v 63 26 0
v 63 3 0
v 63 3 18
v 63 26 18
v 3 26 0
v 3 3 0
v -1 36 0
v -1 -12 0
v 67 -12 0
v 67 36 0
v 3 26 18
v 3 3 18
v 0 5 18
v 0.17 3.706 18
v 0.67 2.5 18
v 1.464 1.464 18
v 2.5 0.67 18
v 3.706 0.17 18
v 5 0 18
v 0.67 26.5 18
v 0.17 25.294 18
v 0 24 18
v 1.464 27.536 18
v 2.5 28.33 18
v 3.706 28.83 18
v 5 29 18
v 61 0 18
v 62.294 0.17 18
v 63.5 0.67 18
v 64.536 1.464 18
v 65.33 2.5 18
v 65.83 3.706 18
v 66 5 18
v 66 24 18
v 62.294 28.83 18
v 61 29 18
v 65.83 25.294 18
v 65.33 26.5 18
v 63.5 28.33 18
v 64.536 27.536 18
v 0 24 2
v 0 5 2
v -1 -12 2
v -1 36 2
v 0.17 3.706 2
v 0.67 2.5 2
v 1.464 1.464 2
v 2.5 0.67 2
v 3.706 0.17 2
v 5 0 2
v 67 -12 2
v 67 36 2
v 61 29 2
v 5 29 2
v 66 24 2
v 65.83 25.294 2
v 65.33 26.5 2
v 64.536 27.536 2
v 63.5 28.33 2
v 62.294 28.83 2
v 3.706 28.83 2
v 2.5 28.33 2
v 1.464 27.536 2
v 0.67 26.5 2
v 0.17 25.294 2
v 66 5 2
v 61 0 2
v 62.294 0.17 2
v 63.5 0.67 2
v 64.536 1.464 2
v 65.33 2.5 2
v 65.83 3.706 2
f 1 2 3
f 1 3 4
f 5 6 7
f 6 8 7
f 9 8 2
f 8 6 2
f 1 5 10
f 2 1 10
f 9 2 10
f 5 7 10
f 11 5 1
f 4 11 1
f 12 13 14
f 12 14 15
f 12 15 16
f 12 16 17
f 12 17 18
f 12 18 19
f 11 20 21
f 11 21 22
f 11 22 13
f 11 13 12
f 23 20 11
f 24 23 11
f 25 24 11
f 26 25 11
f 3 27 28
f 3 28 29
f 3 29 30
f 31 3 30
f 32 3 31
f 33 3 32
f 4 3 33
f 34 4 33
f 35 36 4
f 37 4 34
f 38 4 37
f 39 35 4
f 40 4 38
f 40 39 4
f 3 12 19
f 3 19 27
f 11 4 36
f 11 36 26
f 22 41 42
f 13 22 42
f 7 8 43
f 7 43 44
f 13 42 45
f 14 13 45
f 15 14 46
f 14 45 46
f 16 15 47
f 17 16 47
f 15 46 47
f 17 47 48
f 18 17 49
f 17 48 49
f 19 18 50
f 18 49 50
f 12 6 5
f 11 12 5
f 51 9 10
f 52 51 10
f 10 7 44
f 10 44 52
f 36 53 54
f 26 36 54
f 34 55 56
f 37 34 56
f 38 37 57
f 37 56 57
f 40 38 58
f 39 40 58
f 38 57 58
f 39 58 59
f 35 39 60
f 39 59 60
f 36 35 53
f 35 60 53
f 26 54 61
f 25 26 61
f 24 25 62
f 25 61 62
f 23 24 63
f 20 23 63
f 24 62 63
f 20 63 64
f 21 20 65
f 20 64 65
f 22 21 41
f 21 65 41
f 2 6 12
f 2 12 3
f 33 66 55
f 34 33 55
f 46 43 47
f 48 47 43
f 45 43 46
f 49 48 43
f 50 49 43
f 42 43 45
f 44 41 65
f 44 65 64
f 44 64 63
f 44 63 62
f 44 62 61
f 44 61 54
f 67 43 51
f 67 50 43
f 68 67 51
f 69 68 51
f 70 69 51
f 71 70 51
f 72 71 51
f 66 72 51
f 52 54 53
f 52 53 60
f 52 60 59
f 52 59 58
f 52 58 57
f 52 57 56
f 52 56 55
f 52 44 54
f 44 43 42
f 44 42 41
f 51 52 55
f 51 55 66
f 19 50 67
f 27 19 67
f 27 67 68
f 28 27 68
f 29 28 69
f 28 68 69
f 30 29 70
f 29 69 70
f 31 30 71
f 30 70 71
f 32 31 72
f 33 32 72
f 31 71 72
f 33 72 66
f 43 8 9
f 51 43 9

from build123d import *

# Parameters (mm, degrees)
F0_W     = 68
F0_H     = 48
F1_DEPTH = 2
F0_W_2   = 60
F0_H_2   = 23
F2_DEPTH = 18


with BuildPart() as f1:
    # F0 (on Top) → F1 (new body)
    with BuildSketch(Plane.XY):
        with Locations((33, 12)):
            Rectangle(F0_W, F0_H)
        with BuildLine():
            Line((61, 0), (5, 0))
            ThreePointArc((5, 0), (1.464466, 1.464466), (0, 5))
            Line((0, 5), (0, 24))
            ThreePointArc((0, 24), (1.464466, 27.535534), (5, 29))
            Line((5, 29), (61, 29))
            ThreePointArc((61, 29), (64.535534, 27.535534), (66, 24))
            Line((66, 24), (66, 5))
            ThreePointArc((66, 5), (64.535534, 1.464466), (61, 0))
        make_face(mode=Mode.SUBTRACT)
    extrude(amount=F1_DEPTH)

    # F0 (on Top) → F2 (join)
    with BuildSketch(Plane.XY):
        with BuildLine():
            ThreePointArc((0, 5), (1.464466, 1.464466), (5, 0))
            Line((5, 0), (61, 0))
            ThreePointArc((61, 0), (64.535534, 1.464466), (66, 5))
            Line((66, 5), (66, 24))
            ThreePointArc((66, 24), (64.535534, 27.535534), (61, 29))
            Line((61, 29), (5, 29))
            ThreePointArc((5, 29), (1.464466, 27.535534), (0, 24))
            Line((0, 24), (0, 5))
        make_face()
        with Locations((33, 14.5)):
            Rectangle(F0_W_2, F0_H_2, mode=Mode.SUBTRACT)
    extrude(amount=F2_DEPTH)


solid = f1.part
